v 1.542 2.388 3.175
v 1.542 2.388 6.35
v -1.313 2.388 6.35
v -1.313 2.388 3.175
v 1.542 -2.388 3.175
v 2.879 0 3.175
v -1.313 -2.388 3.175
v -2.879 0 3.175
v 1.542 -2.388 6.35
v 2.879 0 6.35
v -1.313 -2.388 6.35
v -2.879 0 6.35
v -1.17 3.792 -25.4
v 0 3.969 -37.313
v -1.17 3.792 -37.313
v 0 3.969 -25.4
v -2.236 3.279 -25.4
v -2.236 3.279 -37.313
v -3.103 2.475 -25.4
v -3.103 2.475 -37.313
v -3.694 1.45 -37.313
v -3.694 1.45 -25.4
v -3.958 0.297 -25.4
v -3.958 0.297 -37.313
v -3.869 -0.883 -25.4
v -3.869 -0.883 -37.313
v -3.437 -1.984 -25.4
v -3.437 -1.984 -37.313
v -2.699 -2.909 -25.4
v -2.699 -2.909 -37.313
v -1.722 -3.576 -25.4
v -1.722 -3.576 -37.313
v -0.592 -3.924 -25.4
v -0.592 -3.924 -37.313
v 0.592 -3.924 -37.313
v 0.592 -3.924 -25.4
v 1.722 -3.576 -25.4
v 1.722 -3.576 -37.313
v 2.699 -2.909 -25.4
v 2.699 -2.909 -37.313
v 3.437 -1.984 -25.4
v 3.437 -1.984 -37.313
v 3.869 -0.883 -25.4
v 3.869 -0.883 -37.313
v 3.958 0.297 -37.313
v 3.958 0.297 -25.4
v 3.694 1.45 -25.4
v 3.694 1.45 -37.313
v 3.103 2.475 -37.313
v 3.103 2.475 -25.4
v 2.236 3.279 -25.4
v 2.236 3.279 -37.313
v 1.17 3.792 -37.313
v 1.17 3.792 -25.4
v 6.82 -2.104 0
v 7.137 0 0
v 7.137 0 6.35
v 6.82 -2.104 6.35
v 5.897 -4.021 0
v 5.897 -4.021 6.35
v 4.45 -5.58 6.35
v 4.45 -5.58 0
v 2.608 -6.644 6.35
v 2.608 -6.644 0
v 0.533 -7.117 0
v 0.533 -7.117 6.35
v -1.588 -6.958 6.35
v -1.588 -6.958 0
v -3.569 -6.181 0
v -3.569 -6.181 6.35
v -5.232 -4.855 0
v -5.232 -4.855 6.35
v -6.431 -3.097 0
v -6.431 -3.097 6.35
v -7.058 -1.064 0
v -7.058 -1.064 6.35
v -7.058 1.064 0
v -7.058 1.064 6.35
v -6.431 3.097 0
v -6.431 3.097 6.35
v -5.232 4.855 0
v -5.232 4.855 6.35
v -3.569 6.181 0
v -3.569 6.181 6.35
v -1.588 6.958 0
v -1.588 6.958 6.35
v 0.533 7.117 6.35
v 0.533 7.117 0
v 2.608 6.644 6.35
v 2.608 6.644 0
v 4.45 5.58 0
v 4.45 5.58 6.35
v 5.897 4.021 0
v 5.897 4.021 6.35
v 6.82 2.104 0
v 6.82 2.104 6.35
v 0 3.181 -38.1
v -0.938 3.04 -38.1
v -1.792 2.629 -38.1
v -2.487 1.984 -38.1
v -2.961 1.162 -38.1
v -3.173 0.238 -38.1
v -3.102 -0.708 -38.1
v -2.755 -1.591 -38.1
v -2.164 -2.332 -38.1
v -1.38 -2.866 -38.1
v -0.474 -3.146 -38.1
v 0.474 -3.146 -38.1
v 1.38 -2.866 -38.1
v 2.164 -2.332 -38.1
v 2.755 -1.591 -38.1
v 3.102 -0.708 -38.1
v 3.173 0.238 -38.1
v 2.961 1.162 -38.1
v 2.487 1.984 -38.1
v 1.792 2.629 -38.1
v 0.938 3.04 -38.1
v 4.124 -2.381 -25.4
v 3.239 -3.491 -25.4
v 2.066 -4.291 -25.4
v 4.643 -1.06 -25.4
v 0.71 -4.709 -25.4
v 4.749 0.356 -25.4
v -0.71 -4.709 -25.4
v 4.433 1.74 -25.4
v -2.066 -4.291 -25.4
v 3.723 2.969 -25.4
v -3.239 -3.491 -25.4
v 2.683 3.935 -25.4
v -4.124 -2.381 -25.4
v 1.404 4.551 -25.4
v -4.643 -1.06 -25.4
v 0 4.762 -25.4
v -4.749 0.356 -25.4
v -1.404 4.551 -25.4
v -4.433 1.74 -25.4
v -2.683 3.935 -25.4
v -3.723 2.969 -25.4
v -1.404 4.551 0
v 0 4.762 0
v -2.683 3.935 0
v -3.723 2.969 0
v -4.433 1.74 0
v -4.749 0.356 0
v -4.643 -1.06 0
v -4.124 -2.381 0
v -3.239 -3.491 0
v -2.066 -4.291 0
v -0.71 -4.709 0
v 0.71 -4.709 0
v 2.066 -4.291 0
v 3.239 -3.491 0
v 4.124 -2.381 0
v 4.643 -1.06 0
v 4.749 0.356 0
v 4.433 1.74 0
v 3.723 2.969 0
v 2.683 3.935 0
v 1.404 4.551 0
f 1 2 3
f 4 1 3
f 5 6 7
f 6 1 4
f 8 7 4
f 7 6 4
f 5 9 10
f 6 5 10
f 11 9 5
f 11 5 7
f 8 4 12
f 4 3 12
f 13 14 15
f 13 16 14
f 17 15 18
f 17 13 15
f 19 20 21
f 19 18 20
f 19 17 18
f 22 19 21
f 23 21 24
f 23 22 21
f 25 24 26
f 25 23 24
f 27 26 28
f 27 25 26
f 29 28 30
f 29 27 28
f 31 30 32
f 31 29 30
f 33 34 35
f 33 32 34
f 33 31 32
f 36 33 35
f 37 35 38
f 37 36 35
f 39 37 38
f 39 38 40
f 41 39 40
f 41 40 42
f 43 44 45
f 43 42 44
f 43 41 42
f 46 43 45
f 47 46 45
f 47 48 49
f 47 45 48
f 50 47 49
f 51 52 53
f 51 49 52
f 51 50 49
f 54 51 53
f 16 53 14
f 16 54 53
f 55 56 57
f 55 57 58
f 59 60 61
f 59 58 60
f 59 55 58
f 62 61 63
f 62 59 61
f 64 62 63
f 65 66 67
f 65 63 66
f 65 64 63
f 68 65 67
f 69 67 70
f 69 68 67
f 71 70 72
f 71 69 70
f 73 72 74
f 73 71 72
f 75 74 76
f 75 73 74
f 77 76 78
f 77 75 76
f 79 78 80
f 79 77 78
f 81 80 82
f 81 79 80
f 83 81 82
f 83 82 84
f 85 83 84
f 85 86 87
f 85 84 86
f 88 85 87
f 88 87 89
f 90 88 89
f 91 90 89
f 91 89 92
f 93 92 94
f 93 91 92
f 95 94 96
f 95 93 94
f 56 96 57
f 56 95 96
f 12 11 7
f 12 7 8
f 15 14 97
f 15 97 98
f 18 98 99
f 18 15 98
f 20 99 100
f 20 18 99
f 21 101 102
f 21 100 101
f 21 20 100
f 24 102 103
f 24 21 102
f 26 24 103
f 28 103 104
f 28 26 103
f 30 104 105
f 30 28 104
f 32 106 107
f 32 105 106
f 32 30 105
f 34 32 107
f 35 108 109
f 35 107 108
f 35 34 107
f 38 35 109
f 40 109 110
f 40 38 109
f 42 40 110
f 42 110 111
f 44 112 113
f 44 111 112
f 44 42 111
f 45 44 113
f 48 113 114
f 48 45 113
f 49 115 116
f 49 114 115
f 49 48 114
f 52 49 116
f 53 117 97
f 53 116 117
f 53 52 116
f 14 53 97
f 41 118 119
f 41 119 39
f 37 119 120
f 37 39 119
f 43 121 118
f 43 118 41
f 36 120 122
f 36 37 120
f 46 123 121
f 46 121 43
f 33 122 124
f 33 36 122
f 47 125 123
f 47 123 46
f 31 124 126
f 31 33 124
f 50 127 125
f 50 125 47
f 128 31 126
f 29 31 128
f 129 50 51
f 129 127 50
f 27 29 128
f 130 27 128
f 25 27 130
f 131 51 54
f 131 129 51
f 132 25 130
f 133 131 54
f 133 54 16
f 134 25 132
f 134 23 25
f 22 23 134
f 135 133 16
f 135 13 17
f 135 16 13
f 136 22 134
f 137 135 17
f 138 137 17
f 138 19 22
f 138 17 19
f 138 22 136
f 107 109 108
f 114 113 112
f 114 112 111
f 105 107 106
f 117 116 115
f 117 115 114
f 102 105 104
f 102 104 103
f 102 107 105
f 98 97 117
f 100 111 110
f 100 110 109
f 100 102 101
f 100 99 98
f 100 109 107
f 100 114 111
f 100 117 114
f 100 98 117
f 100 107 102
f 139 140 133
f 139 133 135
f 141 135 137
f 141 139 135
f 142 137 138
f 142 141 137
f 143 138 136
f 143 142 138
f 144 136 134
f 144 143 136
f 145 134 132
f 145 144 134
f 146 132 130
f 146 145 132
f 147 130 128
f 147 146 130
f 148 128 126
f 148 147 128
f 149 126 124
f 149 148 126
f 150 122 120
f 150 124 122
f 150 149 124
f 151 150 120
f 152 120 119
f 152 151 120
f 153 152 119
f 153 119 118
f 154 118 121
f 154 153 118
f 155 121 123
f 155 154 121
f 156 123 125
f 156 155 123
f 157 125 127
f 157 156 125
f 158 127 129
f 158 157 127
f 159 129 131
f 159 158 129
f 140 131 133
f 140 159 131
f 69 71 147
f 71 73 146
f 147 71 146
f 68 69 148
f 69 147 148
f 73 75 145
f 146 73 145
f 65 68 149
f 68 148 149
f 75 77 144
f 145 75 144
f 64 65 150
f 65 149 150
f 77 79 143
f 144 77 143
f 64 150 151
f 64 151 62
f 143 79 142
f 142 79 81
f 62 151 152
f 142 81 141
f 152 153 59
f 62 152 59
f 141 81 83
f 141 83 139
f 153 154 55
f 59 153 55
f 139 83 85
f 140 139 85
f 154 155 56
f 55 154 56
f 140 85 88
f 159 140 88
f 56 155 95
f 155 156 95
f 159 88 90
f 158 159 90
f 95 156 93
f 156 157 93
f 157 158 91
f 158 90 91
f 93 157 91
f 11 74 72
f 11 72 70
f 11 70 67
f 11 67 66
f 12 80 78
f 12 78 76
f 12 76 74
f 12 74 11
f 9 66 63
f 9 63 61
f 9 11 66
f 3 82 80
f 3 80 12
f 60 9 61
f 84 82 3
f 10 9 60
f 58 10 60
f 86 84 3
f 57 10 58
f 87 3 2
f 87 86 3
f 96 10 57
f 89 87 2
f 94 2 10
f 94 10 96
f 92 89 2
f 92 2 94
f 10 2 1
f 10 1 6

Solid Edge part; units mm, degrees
sketch "Sketch1" plane through (0, 0, 0) normal (0, 0, 1) x (1, 0, 0)
  circle A0 centre (0, 0) radius 7.1374
  dimension "D1" = 14.2748
extrude "Protrusion1" add sketch "Sketch1" along normal blind 6.35
sketch "Sketch2" plane through (0, 0, 0) normal (0, 0, -1) x (0, 1, 0)
  circle A0 centre (0, 0) radius 4.7625
  dimension "D1" = 9.525
extrude "Protrusion2" add sketch "Sketch2" along normal blind 25.4
sketch "Sketch3" plane through (0, 0, -25.4) normal (0, 0, -1) x (0, 1, 0)
  circle A0 centre (0, 0) radius 3.9688
  dimension "D1" = 7.9375
extrude "Protrusion3" add sketch "Sketch3" along normal blind 12.7
sketch "Sketch4" plane through (0, 0, 6.35) normal (0, 0, 1) x (0, 1, 0)
  line L0 (-2.3876, 1.3131) -> (0, 2.8792)
  line L1 (-2.3876, -1.5424) -> (-2.3876, 1.3131)
  line L2 (-2.3876, -1.5424) -> (0, -2.8792)
  line L3 (2.3876, -1.5424) -> (0, -2.8792)
  line L4 (2.3876, -1.5424) -> (2.3876, 1.3131)
  line L5 (2.3876, 1.3131) -> (0, 2.8792)
  dimension "D1" = 4.7752
extrude "Cutout1" cut sketch "Sketch4" against normal blind 3.175
chamfer "Chamfer1" distance 0.7874 angle 45 1 edges at (0, -3.9688, -38.1)
properties part number "171469" material "Stainless Steel, 304"
